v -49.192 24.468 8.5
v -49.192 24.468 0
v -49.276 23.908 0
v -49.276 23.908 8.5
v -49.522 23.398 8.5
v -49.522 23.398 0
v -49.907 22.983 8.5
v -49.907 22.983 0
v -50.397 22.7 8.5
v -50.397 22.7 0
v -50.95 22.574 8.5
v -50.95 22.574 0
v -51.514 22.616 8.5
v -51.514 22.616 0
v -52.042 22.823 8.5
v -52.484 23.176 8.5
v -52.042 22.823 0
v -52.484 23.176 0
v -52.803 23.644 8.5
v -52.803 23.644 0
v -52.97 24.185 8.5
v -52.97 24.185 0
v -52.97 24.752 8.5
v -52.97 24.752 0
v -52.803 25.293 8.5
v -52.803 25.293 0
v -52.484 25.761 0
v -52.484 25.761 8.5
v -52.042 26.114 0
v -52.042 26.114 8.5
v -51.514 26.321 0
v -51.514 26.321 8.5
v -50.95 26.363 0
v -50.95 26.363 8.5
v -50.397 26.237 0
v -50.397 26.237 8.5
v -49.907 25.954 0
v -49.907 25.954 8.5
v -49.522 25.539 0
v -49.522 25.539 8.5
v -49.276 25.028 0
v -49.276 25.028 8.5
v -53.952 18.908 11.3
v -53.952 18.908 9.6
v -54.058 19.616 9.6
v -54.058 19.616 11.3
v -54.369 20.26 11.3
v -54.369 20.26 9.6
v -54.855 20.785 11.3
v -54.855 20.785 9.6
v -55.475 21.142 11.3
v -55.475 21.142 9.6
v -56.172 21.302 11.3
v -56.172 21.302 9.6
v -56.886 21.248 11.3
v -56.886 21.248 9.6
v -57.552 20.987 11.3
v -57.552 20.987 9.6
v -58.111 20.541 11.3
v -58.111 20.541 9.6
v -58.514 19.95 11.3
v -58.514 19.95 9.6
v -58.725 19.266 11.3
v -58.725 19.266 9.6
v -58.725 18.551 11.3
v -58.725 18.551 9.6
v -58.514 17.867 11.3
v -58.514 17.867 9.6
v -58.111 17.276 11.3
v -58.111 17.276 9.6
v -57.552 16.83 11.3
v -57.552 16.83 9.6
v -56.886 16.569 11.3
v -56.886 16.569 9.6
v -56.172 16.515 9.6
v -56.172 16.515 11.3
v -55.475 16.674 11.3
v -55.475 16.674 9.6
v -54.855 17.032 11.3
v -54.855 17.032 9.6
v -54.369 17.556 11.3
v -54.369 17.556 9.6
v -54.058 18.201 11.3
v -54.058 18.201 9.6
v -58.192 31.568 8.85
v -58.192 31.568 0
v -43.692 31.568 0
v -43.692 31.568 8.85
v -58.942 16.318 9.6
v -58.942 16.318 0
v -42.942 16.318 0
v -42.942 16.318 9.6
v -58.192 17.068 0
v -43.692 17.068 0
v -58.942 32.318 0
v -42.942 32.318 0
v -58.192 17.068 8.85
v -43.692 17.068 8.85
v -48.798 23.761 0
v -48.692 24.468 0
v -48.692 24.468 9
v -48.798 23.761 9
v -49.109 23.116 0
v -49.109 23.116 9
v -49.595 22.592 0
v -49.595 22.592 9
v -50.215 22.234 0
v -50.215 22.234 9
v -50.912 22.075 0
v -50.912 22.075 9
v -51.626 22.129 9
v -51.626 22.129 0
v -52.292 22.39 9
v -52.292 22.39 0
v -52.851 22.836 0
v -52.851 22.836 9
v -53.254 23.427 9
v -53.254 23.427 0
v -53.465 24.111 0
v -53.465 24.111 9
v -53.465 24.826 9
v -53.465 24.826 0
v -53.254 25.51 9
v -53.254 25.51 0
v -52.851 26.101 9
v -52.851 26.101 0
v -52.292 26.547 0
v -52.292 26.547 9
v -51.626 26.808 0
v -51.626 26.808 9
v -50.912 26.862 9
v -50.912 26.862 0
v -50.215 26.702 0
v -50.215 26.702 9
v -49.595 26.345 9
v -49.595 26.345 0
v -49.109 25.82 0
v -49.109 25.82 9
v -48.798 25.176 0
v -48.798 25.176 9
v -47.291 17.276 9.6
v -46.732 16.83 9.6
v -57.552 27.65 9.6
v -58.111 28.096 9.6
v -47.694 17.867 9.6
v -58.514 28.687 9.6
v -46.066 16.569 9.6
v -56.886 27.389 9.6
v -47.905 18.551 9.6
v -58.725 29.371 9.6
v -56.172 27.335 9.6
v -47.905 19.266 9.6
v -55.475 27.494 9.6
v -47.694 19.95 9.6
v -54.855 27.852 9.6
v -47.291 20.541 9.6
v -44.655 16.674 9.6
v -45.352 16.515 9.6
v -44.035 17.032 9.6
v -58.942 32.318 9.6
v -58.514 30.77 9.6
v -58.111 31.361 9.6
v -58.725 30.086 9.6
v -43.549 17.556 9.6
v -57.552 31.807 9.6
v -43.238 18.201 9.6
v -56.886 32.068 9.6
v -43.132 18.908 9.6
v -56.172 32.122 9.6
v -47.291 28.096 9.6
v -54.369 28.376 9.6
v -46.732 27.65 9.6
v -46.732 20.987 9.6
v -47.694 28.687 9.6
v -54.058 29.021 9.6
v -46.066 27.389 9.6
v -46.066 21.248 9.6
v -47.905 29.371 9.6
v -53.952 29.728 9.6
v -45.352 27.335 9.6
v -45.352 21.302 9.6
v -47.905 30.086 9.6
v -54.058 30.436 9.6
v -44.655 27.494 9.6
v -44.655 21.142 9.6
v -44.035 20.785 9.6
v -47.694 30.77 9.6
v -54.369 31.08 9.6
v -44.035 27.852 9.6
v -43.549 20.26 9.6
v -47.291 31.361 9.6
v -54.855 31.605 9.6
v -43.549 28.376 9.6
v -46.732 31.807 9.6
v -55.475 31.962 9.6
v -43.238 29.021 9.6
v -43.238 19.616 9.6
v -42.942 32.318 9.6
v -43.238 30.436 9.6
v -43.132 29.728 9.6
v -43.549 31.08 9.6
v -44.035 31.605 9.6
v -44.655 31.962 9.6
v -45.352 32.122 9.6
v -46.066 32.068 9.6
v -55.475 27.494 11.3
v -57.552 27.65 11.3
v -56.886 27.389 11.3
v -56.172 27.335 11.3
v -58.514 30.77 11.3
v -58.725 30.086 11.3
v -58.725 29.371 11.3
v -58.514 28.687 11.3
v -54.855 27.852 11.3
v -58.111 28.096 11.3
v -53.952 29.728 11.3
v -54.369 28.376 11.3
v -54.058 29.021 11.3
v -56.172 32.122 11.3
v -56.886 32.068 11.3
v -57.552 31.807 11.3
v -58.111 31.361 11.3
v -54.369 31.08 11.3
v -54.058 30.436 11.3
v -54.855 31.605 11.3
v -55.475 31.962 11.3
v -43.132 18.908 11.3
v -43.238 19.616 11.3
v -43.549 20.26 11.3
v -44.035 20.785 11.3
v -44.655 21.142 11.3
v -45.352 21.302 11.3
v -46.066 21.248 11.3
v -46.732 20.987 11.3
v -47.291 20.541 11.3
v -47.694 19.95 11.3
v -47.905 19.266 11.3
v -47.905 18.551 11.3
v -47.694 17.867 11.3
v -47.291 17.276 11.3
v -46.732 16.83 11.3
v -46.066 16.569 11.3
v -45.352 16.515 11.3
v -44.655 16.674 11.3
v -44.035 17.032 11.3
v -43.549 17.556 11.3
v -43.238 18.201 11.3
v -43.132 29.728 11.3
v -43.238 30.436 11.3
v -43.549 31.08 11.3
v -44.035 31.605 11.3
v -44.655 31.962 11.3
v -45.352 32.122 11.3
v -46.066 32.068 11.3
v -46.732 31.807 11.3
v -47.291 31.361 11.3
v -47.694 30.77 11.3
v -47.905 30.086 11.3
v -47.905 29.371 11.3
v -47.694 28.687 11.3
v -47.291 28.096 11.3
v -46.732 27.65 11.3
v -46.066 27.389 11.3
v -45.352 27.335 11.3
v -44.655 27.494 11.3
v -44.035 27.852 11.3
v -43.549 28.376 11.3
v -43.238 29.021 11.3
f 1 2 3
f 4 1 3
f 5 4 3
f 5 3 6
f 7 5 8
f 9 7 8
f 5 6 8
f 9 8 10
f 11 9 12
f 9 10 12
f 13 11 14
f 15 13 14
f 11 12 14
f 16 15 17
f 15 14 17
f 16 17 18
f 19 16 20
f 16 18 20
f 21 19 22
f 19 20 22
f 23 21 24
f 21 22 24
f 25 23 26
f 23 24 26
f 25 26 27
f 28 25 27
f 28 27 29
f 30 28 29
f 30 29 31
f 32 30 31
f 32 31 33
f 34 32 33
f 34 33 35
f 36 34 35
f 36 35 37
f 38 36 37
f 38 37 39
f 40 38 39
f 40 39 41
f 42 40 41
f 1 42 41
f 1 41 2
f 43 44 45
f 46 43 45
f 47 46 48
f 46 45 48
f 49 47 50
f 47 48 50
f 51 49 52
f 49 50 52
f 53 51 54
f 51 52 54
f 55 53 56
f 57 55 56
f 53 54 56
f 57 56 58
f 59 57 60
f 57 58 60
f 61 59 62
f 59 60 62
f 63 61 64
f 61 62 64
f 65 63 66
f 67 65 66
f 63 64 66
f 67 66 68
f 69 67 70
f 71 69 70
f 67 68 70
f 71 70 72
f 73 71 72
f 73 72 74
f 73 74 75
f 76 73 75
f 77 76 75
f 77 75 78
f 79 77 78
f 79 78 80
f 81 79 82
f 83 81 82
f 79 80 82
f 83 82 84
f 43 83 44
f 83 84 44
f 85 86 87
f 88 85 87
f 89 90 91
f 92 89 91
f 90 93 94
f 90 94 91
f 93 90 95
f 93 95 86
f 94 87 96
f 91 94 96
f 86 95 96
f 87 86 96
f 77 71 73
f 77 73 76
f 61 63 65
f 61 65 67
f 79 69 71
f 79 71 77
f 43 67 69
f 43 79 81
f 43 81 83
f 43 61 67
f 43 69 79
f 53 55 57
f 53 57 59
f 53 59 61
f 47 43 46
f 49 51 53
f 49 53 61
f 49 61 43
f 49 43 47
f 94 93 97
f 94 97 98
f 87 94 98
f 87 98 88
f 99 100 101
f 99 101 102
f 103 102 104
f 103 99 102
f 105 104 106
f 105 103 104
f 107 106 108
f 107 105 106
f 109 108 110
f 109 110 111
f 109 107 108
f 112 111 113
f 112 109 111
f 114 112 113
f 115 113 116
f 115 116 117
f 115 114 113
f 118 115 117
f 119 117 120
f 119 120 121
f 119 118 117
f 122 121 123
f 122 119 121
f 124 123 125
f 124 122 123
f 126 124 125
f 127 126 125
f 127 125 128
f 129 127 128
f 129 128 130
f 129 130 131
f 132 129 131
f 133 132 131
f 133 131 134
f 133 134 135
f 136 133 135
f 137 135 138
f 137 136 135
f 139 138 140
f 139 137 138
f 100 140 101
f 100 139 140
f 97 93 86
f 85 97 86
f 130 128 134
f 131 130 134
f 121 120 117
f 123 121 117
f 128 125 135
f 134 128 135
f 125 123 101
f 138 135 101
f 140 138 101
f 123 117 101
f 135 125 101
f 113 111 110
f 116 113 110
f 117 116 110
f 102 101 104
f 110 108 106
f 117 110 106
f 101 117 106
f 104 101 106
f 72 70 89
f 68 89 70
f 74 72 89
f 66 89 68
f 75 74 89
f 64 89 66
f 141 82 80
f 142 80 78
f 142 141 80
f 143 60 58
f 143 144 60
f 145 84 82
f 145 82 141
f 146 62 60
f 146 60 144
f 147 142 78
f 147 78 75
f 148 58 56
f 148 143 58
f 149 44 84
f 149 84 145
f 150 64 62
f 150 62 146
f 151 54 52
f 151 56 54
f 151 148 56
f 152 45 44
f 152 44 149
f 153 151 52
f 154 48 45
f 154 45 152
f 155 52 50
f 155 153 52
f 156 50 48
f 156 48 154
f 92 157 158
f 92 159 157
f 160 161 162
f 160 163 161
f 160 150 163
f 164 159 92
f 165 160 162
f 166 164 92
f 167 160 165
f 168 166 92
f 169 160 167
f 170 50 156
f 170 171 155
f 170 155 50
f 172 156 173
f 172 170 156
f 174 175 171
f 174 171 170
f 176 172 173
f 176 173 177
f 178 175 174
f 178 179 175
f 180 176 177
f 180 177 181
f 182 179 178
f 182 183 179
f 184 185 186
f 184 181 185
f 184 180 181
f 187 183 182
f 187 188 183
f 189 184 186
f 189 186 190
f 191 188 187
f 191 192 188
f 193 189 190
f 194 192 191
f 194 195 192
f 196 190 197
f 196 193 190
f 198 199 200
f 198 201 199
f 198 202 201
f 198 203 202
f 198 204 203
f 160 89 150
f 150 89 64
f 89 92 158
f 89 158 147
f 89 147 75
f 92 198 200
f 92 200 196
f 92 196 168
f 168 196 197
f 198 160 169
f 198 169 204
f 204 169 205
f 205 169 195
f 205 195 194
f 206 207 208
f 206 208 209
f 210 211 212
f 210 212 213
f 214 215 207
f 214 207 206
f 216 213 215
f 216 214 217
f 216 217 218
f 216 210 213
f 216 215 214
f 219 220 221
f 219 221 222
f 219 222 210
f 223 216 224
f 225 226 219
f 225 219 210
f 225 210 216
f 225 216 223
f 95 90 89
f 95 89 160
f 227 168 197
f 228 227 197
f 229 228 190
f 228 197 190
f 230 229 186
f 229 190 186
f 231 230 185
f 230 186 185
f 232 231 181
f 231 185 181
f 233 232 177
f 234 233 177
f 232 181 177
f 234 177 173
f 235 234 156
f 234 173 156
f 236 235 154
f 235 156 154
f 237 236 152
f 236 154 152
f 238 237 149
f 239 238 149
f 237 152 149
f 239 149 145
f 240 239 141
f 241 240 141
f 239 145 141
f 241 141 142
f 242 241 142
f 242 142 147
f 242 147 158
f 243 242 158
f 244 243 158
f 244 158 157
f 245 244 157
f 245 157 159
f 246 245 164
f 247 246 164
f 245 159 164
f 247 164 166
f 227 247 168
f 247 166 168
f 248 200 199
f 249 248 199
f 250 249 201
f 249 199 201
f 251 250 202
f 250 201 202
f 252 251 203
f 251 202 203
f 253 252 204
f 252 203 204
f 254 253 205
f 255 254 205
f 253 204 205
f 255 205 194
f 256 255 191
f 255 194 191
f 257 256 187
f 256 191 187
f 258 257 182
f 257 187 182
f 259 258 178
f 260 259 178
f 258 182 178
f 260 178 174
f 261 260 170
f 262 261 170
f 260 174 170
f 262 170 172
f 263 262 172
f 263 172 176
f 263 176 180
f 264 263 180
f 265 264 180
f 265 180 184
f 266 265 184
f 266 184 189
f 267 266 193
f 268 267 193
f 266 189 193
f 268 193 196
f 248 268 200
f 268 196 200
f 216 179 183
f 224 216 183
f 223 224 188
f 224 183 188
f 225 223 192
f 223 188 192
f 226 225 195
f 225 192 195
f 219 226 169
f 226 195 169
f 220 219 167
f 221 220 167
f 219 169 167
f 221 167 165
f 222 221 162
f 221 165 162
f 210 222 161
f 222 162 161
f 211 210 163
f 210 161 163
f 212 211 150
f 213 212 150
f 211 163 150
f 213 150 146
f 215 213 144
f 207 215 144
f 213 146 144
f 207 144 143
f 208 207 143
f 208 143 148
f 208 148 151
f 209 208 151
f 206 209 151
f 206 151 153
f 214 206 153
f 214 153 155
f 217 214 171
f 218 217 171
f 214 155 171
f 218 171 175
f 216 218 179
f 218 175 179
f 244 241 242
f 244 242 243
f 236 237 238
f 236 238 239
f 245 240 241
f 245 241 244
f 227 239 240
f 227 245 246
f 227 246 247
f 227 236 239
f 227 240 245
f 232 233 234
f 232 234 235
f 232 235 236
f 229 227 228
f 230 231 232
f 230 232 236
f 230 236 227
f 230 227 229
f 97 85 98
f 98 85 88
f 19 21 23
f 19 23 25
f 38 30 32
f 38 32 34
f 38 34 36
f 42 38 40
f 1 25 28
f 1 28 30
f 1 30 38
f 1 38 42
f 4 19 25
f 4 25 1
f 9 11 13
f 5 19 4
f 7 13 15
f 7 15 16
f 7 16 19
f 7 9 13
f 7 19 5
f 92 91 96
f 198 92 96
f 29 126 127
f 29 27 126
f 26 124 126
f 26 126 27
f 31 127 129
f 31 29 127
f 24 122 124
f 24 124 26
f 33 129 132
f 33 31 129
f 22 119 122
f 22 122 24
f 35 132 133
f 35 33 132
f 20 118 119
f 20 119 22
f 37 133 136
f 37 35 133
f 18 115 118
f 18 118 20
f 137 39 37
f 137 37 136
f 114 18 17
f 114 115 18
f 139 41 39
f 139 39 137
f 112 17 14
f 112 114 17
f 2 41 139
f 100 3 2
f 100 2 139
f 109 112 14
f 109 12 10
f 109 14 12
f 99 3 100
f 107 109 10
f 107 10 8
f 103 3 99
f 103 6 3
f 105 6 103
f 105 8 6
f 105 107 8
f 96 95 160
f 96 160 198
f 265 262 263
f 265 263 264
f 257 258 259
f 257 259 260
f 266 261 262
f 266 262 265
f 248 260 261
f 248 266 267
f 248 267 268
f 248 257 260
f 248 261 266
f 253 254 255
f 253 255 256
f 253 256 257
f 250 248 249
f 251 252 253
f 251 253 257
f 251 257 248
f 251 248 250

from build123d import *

# Parameters (mm, degrees)
F0_W      = 16
F0_H      = 16
F1_DEPTH  = 9.6
F3_T      = -0.75
F5_R      = 2.4
F6_DEPTH  = 9
F7_T      = -0.5
F8_R      = 2.4
F9_DEPTH  = 1.7
F10_R     = 2.4
F11_DEPTH = 1.7
F12_R     = 2.4
F13_DEPTH = 1.7
F14_R     = 2.4
F15_DEPTH = 1.7


with BuildPart() as f1:
    # F0 (on Top) → F1 (new body)
    with BuildSketch(Plane.XY):
        with Locations((-50.941612, 24.318393)):
            Rectangle(F0_W, F0_H)
    extrude(amount=F1_DEPTH)

    # F3
    f3_openings = [f1.faces().sort_by_distance(p)[0] for p in [
        (-50.941612, 24.318393, 0),
    ]]
    offset(amount=F3_T, openings=f3_openings)

    # F8 (on face) → F9 (join)
    with BuildSketch(Plane.XY.offset(9.6)):
        with Locations((-56.351612, 29.728393)):
            Circle(F8_R)
    extrude(amount=F9_DEPTH)

    # F10 (on face) → F11 (join)
    with BuildSketch(Plane.XY.offset(9.6)):
        with Locations((-45.531612, 29.728393)):
            Circle(F10_R)
    extrude(amount=F11_DEPTH)

    # F12 (on face) → F13 (join)
    with BuildSketch(Plane.XY.offset(9.6)):
        with Locations((-56.351612, 18.908393)):
            Circle(F12_R)
    extrude(amount=F13_DEPTH)

    # F14 (on face) → F15 (join)
    with BuildSketch(Plane.XY.offset(9.6)):
        with Locations((-45.531612, 18.908393)):
            Circle(F14_R)
    extrude(amount=F15_DEPTH)


with BuildPart() as f6:
    # F5 (on face) → F6 (new body)
    with BuildSketch(Plane(origin=(0, 0, 0), x_dir=(1, 0, 0), z_dir=(0, 0, -1))):
        with Locations((-51.091612, -24.468393)):
            Circle(F5_R)
    extrude(amount=-F6_DEPTH)

    # F7
    f7_openings = [f6.faces().sort_by_distance(p)[0] for p in [
        (-51.091612, 24.468393, 0),
    ]]
    offset(amount=F7_T, openings=f7_openings)


solid = Compound([f1.part, f6.part])
